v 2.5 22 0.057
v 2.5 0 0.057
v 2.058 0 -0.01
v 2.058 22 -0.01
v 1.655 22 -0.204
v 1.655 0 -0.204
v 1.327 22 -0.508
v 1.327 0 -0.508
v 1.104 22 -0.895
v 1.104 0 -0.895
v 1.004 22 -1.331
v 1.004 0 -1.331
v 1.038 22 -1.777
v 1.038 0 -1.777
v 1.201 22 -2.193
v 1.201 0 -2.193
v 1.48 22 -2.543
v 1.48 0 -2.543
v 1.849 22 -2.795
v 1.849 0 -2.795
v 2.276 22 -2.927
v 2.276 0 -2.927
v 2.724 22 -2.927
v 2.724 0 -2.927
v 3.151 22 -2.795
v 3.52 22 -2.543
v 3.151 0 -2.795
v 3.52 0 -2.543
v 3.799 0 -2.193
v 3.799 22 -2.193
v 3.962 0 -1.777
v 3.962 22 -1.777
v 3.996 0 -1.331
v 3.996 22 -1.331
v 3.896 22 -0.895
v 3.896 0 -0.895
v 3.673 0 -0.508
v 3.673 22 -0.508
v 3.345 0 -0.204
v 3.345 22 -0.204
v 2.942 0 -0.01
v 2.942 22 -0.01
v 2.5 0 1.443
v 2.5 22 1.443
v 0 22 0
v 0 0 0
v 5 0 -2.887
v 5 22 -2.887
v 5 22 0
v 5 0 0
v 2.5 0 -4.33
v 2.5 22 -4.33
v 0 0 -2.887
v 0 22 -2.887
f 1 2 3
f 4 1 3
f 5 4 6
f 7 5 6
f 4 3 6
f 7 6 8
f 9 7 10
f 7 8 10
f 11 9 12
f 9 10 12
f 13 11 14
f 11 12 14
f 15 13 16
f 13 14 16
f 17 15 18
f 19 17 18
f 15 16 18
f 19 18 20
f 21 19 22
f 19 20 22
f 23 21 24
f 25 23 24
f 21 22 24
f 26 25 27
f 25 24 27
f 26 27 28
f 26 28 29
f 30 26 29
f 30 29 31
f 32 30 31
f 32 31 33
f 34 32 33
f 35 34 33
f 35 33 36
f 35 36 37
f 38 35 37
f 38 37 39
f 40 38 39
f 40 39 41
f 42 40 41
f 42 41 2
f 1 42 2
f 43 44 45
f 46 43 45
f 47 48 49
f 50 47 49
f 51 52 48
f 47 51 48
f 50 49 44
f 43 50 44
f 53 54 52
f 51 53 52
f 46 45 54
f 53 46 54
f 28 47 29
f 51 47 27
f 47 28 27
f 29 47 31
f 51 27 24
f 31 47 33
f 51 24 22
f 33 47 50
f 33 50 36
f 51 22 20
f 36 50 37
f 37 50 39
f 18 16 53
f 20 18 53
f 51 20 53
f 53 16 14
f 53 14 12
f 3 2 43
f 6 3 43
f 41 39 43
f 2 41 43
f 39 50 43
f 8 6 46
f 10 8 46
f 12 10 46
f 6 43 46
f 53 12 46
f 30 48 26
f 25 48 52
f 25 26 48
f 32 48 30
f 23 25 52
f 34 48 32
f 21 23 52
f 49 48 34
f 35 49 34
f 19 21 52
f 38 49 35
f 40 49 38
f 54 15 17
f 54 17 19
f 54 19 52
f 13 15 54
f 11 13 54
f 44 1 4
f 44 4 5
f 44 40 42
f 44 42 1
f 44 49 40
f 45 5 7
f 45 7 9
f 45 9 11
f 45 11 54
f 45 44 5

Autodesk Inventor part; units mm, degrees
ref_plane "YZ Plane" through (0, 0, 0) normal (1, 0, 0) x (0, 1, 0)
ref_plane "XY Plane" through (0, 0, 0) normal (0, 0, 1) x (1, 0, 0)
sketch "Skizze1" plane through (0, 0, 0) normal (0, 1, 0) x (-1, 0, 0)
  line L0 (0, 0) -> (0, -2.8868)
  line L1 (0, -2.8868) -> (-2.5, -4.3301)
  line L2 (-2.5, -4.3301) -> (-5, -2.8868)
  line L3 (-5, -2.8868) -> (-5, 0)
  line L4 (-5, 0) -> (-2.5, 1.4434)
  line L5 (-2.5, 1.4434) -> (0, 0)
  dimension "d2" = 120
  dimension "d4" = 120
  dimension "d6" = 120
  dimension "d8" = 120
  dimension "d11" = 5
  dimension "d12" = 5
  dimension "d13" = 5
extrude "Extrusion1" add sketch "Skizze1" along normal blind 22
sketch "Skizze2" plane through (0, 22, 0) normal (0, 1, 0) x (1, 0, 0)
  line L0 (0, 2.8868) -> (0, 0) projected
  line L1 (5, 0) -> (5, 2.8868) projected
  line L2 (0, 0) -> (5, 2.8868) construction
  line L3 (0, 2.8868) -> (5, 0) construction
  point P0 (2.5, 1.4434)
hole "Bohrung1" at (2.5, 22, -1.4434) direction (0, -1, 0) diameter 3 end through all
thread "Gewinde1" size "M3x0.5" class "6H" standard "ANSI Metric M Profile" full length
properties part number "abstandshalter_22mm"
